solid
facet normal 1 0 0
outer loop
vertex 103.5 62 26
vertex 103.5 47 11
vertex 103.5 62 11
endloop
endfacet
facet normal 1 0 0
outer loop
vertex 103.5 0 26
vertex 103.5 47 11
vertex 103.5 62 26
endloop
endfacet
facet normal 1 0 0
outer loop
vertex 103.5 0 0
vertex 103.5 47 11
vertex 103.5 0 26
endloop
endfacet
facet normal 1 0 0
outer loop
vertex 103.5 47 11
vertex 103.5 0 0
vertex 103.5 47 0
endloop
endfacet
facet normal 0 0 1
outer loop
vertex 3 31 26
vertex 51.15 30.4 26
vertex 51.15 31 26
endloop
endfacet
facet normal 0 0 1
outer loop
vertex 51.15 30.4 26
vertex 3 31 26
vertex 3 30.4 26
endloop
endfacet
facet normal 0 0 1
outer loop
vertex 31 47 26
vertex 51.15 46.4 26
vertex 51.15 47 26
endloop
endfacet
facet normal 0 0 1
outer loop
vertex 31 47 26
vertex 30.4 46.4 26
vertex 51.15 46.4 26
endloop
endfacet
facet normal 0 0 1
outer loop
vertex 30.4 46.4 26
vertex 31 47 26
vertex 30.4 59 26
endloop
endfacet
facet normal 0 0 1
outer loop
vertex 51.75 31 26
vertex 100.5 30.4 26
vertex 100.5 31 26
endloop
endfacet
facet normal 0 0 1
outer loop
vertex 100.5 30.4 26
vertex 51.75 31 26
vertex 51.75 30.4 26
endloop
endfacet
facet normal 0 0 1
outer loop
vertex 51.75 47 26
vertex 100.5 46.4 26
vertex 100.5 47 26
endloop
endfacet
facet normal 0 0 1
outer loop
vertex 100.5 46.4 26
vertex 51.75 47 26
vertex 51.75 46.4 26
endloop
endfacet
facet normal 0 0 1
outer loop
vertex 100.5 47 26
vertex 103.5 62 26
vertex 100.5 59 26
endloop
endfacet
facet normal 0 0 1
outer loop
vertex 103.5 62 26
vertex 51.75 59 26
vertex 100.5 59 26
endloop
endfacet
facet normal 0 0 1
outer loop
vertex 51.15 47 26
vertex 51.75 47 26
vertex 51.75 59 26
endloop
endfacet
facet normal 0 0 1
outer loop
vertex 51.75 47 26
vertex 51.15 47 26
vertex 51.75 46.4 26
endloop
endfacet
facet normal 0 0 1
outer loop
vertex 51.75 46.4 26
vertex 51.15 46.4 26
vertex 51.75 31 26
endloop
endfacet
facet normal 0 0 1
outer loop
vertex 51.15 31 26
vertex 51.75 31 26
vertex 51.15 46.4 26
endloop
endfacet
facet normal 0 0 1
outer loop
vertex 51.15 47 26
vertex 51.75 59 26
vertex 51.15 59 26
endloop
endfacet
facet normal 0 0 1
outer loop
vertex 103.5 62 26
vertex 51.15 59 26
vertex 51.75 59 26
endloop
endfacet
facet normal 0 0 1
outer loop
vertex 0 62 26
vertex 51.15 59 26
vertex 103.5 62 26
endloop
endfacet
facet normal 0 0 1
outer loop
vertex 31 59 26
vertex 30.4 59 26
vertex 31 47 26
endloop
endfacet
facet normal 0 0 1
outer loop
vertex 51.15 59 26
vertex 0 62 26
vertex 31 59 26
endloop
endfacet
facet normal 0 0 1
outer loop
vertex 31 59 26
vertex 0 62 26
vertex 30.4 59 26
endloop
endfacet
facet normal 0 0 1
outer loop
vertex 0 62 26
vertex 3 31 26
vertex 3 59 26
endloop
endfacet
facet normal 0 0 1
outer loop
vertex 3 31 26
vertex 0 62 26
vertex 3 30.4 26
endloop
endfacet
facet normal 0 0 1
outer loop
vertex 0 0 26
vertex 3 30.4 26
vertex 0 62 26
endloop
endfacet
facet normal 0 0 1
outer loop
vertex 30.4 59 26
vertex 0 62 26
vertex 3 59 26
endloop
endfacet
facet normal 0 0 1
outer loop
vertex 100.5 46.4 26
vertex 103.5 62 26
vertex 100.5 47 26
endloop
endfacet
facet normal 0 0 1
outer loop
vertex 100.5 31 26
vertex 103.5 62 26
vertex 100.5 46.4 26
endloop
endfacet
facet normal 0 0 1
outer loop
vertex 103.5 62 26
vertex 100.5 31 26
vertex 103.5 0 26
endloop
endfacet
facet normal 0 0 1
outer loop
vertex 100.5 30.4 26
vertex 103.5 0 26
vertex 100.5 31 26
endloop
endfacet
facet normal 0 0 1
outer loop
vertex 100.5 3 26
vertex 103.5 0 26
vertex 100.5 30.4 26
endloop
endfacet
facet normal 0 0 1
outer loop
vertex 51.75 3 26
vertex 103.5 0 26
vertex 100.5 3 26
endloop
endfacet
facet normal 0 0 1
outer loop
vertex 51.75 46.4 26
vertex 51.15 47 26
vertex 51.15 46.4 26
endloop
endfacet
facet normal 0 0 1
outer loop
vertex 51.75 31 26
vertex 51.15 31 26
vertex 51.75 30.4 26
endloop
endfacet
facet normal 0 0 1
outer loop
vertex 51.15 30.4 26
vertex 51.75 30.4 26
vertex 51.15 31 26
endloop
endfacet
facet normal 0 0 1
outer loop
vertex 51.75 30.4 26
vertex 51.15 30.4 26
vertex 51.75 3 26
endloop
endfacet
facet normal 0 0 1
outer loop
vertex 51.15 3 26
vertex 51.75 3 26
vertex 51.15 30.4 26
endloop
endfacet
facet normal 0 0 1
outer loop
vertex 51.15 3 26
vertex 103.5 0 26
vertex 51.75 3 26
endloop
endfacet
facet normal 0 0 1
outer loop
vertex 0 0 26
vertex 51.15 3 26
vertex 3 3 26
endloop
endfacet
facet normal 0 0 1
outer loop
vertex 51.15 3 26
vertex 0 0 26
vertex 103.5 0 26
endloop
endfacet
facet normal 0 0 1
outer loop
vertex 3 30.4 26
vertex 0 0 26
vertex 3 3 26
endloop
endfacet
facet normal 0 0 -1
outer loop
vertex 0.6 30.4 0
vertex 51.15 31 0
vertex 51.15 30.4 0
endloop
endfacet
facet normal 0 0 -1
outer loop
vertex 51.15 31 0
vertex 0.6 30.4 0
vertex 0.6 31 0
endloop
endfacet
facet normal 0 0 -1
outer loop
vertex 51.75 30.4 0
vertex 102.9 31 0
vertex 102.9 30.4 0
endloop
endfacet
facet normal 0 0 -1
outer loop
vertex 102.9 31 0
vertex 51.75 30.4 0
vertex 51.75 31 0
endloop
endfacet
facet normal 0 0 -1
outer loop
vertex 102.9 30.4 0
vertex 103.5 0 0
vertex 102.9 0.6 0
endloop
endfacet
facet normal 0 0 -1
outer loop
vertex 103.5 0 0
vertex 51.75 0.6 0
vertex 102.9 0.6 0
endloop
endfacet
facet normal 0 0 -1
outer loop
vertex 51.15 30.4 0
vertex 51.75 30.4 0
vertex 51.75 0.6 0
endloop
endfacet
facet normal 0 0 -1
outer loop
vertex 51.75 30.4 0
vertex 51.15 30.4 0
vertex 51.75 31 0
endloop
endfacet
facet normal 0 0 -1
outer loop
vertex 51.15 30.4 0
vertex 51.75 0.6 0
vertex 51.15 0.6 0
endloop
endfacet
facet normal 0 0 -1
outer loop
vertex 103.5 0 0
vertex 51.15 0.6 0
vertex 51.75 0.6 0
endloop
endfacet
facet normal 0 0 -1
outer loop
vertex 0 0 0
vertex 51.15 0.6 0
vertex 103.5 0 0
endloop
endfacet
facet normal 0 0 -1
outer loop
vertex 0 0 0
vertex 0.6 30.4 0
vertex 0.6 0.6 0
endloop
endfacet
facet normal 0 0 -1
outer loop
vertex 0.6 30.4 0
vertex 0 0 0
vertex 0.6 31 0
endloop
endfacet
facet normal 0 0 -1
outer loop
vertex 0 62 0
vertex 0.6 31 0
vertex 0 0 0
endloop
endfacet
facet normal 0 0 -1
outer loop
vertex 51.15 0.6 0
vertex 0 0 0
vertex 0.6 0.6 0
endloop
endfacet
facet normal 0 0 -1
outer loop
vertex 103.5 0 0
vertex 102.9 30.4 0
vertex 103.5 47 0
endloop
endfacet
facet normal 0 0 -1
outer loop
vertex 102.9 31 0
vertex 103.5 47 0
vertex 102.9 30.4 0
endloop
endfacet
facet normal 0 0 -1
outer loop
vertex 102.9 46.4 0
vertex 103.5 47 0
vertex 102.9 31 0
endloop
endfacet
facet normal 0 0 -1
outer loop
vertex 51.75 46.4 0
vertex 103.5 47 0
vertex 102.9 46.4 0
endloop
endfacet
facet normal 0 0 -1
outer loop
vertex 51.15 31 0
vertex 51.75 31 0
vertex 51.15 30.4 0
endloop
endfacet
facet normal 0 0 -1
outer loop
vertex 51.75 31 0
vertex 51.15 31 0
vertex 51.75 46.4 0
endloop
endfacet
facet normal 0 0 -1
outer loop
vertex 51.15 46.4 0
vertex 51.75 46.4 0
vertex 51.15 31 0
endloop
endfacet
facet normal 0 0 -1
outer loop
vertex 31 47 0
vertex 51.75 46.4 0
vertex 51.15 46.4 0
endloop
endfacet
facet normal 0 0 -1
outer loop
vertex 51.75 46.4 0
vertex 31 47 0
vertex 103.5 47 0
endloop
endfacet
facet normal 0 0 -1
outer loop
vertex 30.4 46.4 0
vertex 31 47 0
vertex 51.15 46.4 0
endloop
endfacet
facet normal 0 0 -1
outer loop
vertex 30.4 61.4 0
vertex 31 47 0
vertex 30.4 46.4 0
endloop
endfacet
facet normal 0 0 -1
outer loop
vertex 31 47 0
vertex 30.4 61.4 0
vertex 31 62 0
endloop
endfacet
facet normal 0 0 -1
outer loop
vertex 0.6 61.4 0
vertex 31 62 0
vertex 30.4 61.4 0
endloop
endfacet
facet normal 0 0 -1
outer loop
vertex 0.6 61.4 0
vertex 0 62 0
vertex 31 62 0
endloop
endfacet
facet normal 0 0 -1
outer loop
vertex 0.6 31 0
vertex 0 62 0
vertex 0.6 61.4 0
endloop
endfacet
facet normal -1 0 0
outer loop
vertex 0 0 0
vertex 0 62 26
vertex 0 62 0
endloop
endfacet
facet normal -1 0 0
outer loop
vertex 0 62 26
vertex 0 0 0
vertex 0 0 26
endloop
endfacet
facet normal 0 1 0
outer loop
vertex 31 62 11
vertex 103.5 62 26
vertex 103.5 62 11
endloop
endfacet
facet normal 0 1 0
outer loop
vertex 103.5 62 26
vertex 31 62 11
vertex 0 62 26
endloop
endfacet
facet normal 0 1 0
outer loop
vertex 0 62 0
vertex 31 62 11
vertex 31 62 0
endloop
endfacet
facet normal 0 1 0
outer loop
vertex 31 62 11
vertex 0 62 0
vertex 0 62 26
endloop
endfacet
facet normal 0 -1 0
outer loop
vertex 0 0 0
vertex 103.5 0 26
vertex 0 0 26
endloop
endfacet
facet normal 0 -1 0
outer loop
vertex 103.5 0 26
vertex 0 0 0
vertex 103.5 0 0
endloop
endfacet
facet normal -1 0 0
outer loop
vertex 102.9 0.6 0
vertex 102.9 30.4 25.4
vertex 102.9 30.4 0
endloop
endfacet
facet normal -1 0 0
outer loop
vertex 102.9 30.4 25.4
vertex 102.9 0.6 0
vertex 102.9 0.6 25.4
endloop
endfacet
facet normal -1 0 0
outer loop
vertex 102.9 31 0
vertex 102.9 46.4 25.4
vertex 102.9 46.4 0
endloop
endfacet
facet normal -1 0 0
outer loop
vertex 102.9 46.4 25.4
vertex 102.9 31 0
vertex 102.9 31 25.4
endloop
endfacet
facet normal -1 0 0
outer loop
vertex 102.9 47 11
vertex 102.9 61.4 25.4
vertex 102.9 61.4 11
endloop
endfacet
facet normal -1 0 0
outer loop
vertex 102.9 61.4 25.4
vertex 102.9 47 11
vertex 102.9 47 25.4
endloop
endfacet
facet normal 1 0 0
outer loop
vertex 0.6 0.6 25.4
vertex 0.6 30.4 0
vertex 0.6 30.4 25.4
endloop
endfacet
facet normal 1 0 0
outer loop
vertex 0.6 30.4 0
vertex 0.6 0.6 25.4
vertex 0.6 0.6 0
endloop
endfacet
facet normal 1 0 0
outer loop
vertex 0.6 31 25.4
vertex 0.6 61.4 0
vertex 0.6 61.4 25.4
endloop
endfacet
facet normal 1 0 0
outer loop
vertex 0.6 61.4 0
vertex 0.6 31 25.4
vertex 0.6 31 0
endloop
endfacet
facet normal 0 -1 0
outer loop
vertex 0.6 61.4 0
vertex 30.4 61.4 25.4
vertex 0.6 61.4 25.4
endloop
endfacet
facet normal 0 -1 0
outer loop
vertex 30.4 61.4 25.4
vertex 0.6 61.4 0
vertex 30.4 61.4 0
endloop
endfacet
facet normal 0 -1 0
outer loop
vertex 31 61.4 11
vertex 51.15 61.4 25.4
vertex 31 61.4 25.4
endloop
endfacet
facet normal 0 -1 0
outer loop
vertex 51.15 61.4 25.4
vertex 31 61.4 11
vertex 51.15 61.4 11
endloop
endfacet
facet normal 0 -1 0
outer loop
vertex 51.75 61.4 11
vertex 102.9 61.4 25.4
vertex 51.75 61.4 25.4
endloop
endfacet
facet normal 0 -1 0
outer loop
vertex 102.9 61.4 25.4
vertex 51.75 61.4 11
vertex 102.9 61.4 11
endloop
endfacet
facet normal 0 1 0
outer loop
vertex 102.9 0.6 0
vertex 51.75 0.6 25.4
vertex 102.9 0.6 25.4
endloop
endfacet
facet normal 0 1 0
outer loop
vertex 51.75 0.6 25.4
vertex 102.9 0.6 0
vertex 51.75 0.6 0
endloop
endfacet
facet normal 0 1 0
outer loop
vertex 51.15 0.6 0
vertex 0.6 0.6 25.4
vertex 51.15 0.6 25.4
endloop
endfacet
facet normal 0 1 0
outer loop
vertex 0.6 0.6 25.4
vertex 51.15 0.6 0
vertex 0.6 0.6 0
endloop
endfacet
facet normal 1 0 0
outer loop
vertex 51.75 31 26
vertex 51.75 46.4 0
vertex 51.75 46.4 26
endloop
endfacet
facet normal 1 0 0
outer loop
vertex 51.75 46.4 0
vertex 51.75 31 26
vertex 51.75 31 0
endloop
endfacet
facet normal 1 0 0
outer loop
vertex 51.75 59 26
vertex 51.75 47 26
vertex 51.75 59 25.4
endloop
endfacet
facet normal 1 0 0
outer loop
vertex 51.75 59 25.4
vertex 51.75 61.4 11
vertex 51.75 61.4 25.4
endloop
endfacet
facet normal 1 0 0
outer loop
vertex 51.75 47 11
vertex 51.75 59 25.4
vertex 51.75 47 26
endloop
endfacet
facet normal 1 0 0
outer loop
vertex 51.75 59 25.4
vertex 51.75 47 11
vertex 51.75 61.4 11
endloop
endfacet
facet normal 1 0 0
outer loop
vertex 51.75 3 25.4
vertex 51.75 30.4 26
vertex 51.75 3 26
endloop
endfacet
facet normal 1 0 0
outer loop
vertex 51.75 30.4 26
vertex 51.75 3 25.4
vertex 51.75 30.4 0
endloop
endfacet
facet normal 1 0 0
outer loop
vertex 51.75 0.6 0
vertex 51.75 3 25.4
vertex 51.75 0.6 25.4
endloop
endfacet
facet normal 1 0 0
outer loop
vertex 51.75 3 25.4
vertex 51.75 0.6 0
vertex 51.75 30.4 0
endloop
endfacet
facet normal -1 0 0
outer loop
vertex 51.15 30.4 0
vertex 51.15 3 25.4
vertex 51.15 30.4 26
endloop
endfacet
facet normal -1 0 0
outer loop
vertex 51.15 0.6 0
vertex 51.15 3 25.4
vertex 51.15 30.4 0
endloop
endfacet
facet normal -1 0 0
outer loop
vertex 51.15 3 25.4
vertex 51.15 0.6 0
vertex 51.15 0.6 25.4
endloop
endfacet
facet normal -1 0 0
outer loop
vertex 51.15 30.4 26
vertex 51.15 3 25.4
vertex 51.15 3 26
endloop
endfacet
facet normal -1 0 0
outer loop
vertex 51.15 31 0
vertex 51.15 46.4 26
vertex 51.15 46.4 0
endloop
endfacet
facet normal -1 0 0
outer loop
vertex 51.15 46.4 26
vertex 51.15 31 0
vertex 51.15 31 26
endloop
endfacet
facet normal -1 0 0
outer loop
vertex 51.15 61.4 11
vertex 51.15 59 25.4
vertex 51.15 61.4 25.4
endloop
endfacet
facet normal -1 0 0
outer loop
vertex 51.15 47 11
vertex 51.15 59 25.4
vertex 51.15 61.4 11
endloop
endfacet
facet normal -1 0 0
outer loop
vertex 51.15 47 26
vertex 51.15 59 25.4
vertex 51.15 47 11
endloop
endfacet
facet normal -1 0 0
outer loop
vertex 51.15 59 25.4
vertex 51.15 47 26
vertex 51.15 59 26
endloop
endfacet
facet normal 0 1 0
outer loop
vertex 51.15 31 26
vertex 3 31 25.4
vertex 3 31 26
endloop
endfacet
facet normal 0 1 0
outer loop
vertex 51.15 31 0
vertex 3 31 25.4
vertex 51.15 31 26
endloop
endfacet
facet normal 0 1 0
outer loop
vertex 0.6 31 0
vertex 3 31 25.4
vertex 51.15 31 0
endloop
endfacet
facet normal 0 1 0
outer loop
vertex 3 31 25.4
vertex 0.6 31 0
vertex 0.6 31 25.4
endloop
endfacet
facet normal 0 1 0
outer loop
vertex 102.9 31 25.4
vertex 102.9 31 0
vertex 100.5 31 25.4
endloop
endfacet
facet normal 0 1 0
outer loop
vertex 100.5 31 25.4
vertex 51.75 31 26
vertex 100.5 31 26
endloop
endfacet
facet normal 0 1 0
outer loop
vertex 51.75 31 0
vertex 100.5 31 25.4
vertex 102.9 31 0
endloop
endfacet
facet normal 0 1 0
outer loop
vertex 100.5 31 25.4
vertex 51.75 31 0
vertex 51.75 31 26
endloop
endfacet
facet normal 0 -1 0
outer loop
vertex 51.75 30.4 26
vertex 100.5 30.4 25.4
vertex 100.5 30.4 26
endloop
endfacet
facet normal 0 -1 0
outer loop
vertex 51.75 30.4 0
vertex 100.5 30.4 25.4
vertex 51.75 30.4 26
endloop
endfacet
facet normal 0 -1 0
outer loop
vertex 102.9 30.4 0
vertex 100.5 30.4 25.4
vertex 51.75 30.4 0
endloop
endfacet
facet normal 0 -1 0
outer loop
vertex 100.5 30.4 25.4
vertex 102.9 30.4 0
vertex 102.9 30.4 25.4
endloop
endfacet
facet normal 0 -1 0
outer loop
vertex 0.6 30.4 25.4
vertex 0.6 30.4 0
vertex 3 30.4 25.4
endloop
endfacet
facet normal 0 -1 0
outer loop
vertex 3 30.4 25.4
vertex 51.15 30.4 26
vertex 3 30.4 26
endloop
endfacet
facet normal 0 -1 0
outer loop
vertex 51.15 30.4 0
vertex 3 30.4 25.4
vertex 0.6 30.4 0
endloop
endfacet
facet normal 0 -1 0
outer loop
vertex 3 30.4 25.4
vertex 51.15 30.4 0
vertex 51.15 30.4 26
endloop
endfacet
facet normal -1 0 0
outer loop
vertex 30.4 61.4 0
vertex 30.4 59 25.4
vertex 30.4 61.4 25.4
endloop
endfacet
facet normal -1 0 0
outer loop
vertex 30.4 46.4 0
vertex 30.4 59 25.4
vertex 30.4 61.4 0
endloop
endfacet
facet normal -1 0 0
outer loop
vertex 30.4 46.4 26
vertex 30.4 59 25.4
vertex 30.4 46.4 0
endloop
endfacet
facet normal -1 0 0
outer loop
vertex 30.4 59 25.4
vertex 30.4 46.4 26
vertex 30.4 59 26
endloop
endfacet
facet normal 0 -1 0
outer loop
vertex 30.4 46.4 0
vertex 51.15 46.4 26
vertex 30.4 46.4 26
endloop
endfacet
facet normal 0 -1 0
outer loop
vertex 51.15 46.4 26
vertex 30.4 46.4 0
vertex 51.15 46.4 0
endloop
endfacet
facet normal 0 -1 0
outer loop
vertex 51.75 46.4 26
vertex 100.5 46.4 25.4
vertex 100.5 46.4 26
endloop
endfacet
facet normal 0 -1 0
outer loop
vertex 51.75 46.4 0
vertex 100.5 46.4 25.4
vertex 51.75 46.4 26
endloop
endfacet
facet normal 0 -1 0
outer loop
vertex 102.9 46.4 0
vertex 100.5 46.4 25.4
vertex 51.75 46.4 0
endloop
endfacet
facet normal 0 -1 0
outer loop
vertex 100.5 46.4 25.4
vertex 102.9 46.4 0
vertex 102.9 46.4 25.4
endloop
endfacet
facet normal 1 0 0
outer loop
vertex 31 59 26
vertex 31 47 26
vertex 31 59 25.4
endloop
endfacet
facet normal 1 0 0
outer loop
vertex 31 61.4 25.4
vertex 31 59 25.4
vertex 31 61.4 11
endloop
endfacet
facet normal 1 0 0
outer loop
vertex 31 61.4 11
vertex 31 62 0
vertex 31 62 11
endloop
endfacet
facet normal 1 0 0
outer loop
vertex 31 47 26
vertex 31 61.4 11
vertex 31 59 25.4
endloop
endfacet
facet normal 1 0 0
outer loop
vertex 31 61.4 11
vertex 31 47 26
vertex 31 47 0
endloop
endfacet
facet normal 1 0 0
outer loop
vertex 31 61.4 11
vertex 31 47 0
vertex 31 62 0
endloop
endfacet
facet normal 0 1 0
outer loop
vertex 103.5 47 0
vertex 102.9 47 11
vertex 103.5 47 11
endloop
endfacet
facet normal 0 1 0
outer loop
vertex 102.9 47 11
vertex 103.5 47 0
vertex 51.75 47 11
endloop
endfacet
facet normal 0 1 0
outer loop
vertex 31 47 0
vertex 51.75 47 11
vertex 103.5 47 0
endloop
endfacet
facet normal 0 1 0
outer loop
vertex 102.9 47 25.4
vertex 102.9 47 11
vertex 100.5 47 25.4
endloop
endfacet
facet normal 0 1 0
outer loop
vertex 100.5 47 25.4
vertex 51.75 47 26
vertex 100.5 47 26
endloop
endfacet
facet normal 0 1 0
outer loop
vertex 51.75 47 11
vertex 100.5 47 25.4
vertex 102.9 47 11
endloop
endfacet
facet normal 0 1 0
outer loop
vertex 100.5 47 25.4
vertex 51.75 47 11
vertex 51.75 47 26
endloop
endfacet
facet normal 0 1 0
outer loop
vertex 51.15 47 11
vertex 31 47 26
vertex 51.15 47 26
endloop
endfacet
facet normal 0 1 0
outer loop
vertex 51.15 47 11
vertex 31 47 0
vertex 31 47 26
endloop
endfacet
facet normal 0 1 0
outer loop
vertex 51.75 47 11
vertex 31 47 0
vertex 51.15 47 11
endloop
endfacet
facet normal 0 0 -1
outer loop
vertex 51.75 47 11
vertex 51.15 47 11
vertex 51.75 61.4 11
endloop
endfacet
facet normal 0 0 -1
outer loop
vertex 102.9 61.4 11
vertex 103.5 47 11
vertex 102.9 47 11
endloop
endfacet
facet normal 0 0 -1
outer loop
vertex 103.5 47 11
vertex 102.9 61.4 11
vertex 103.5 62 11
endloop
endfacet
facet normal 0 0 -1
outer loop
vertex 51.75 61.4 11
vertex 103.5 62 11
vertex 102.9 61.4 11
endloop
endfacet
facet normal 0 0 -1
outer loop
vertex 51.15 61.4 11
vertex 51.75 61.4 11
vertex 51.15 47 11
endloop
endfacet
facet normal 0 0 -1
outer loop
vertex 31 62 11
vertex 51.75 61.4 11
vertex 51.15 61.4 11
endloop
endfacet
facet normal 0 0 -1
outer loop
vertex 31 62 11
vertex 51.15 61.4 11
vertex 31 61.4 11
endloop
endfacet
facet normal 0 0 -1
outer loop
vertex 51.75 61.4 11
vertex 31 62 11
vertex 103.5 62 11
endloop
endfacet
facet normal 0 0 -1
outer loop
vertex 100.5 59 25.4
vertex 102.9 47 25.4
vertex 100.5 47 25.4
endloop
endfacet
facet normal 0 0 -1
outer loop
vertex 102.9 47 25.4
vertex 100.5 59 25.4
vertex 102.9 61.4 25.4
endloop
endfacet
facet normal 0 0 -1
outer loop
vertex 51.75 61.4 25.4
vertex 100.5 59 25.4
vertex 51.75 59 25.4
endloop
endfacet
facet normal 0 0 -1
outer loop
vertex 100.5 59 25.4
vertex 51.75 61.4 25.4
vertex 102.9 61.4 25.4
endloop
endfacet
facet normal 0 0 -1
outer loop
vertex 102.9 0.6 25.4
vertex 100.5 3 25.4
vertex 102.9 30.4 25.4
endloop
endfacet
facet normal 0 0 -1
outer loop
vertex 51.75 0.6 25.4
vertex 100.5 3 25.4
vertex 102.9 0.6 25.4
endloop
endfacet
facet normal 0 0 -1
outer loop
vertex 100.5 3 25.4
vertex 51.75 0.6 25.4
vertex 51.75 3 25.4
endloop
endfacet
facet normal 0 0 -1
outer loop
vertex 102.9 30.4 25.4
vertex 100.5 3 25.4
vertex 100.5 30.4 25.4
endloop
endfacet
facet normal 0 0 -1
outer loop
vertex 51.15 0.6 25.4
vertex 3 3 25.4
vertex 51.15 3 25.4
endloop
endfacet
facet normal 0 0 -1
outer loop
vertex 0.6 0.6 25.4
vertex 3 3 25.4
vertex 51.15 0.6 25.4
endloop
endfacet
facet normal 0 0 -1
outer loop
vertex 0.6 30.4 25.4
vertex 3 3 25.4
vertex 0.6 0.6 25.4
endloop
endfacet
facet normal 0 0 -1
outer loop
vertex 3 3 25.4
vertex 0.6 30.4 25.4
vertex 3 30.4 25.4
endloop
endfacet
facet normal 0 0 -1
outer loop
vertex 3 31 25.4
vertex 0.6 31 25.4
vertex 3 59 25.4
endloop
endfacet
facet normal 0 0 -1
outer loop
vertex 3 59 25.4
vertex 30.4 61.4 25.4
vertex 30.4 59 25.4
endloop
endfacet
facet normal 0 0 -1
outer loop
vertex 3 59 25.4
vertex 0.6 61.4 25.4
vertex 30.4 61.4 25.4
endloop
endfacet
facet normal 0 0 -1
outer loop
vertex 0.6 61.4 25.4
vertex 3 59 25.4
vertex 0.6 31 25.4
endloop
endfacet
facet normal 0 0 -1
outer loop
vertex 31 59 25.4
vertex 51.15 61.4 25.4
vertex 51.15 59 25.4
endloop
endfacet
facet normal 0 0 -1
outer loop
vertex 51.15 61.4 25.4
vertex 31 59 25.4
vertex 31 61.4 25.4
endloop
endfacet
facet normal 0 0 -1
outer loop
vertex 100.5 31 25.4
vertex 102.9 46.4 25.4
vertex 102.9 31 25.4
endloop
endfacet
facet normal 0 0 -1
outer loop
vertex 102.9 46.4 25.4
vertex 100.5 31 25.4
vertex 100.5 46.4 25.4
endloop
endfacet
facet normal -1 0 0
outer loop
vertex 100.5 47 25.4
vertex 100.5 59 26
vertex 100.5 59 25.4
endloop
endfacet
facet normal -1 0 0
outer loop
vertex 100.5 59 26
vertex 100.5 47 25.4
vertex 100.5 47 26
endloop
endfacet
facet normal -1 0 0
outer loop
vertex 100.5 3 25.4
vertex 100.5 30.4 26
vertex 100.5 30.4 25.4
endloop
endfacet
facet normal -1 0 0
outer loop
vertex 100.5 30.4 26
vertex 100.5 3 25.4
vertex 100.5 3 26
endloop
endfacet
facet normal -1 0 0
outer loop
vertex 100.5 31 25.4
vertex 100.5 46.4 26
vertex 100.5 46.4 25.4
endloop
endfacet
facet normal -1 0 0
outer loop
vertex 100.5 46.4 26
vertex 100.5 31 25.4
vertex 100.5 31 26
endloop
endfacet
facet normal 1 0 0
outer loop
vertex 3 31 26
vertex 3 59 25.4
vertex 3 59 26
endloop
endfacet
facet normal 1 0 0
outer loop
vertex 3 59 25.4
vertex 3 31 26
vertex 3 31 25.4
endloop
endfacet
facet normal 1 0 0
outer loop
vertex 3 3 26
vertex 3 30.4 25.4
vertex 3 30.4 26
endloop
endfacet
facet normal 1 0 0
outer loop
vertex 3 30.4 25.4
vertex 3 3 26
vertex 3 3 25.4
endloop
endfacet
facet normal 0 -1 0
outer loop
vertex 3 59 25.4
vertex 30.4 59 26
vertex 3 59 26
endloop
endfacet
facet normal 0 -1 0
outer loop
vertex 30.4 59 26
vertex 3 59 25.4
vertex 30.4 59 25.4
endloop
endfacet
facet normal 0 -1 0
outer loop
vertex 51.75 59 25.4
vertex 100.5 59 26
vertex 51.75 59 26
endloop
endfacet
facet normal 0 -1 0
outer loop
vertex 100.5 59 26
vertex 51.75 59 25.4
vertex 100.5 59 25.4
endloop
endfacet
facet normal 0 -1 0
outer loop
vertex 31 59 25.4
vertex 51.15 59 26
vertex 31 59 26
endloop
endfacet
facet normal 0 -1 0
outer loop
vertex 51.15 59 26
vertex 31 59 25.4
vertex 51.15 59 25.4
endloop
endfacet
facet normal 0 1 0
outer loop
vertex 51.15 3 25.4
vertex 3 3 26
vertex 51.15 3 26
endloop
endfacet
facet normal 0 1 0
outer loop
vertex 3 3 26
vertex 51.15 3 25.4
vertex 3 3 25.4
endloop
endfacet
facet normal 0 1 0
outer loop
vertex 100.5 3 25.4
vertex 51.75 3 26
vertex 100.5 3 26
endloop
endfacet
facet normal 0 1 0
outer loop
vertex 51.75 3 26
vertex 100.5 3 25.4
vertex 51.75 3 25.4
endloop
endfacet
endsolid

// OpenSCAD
X = 104 -0.5;
Y = 47 + 15;


X3 = X-31;
Y3 = 15;

Z1 = 11;
Z2 = 26;

WALL = 0.6;

module hollow_box(xyz_trans, xyz, wall){
    difference(){
        translate(xyz_trans) 
            cube(xyz);
        translate(xyz_trans + [wall, wall, 0]) 
            cube(xyz - [2*wall, 2*wall, 0]);
    }
}


module grid(){
 hollow_box([0,0,0],[X,Y,Z2],WALL);

 hollow_box([0,0,0],[X/2,Y,Z2],WALL);

 hollow_box([0,0,0],[X,Y/2,Z2],WALL);

 hollow_box([X-X3-WALL,Y-Y3-WALL,0],[X3+WALL,Y3+WALL,Z2], WALL);
}

difference(){
    grid();
    translate([X-X3,Y-Y3,0])
    cube([X3,Y3,Z1]);
}

hollow_box([0,0,Z2-0.6], [X,Y, 0.6], 3);
